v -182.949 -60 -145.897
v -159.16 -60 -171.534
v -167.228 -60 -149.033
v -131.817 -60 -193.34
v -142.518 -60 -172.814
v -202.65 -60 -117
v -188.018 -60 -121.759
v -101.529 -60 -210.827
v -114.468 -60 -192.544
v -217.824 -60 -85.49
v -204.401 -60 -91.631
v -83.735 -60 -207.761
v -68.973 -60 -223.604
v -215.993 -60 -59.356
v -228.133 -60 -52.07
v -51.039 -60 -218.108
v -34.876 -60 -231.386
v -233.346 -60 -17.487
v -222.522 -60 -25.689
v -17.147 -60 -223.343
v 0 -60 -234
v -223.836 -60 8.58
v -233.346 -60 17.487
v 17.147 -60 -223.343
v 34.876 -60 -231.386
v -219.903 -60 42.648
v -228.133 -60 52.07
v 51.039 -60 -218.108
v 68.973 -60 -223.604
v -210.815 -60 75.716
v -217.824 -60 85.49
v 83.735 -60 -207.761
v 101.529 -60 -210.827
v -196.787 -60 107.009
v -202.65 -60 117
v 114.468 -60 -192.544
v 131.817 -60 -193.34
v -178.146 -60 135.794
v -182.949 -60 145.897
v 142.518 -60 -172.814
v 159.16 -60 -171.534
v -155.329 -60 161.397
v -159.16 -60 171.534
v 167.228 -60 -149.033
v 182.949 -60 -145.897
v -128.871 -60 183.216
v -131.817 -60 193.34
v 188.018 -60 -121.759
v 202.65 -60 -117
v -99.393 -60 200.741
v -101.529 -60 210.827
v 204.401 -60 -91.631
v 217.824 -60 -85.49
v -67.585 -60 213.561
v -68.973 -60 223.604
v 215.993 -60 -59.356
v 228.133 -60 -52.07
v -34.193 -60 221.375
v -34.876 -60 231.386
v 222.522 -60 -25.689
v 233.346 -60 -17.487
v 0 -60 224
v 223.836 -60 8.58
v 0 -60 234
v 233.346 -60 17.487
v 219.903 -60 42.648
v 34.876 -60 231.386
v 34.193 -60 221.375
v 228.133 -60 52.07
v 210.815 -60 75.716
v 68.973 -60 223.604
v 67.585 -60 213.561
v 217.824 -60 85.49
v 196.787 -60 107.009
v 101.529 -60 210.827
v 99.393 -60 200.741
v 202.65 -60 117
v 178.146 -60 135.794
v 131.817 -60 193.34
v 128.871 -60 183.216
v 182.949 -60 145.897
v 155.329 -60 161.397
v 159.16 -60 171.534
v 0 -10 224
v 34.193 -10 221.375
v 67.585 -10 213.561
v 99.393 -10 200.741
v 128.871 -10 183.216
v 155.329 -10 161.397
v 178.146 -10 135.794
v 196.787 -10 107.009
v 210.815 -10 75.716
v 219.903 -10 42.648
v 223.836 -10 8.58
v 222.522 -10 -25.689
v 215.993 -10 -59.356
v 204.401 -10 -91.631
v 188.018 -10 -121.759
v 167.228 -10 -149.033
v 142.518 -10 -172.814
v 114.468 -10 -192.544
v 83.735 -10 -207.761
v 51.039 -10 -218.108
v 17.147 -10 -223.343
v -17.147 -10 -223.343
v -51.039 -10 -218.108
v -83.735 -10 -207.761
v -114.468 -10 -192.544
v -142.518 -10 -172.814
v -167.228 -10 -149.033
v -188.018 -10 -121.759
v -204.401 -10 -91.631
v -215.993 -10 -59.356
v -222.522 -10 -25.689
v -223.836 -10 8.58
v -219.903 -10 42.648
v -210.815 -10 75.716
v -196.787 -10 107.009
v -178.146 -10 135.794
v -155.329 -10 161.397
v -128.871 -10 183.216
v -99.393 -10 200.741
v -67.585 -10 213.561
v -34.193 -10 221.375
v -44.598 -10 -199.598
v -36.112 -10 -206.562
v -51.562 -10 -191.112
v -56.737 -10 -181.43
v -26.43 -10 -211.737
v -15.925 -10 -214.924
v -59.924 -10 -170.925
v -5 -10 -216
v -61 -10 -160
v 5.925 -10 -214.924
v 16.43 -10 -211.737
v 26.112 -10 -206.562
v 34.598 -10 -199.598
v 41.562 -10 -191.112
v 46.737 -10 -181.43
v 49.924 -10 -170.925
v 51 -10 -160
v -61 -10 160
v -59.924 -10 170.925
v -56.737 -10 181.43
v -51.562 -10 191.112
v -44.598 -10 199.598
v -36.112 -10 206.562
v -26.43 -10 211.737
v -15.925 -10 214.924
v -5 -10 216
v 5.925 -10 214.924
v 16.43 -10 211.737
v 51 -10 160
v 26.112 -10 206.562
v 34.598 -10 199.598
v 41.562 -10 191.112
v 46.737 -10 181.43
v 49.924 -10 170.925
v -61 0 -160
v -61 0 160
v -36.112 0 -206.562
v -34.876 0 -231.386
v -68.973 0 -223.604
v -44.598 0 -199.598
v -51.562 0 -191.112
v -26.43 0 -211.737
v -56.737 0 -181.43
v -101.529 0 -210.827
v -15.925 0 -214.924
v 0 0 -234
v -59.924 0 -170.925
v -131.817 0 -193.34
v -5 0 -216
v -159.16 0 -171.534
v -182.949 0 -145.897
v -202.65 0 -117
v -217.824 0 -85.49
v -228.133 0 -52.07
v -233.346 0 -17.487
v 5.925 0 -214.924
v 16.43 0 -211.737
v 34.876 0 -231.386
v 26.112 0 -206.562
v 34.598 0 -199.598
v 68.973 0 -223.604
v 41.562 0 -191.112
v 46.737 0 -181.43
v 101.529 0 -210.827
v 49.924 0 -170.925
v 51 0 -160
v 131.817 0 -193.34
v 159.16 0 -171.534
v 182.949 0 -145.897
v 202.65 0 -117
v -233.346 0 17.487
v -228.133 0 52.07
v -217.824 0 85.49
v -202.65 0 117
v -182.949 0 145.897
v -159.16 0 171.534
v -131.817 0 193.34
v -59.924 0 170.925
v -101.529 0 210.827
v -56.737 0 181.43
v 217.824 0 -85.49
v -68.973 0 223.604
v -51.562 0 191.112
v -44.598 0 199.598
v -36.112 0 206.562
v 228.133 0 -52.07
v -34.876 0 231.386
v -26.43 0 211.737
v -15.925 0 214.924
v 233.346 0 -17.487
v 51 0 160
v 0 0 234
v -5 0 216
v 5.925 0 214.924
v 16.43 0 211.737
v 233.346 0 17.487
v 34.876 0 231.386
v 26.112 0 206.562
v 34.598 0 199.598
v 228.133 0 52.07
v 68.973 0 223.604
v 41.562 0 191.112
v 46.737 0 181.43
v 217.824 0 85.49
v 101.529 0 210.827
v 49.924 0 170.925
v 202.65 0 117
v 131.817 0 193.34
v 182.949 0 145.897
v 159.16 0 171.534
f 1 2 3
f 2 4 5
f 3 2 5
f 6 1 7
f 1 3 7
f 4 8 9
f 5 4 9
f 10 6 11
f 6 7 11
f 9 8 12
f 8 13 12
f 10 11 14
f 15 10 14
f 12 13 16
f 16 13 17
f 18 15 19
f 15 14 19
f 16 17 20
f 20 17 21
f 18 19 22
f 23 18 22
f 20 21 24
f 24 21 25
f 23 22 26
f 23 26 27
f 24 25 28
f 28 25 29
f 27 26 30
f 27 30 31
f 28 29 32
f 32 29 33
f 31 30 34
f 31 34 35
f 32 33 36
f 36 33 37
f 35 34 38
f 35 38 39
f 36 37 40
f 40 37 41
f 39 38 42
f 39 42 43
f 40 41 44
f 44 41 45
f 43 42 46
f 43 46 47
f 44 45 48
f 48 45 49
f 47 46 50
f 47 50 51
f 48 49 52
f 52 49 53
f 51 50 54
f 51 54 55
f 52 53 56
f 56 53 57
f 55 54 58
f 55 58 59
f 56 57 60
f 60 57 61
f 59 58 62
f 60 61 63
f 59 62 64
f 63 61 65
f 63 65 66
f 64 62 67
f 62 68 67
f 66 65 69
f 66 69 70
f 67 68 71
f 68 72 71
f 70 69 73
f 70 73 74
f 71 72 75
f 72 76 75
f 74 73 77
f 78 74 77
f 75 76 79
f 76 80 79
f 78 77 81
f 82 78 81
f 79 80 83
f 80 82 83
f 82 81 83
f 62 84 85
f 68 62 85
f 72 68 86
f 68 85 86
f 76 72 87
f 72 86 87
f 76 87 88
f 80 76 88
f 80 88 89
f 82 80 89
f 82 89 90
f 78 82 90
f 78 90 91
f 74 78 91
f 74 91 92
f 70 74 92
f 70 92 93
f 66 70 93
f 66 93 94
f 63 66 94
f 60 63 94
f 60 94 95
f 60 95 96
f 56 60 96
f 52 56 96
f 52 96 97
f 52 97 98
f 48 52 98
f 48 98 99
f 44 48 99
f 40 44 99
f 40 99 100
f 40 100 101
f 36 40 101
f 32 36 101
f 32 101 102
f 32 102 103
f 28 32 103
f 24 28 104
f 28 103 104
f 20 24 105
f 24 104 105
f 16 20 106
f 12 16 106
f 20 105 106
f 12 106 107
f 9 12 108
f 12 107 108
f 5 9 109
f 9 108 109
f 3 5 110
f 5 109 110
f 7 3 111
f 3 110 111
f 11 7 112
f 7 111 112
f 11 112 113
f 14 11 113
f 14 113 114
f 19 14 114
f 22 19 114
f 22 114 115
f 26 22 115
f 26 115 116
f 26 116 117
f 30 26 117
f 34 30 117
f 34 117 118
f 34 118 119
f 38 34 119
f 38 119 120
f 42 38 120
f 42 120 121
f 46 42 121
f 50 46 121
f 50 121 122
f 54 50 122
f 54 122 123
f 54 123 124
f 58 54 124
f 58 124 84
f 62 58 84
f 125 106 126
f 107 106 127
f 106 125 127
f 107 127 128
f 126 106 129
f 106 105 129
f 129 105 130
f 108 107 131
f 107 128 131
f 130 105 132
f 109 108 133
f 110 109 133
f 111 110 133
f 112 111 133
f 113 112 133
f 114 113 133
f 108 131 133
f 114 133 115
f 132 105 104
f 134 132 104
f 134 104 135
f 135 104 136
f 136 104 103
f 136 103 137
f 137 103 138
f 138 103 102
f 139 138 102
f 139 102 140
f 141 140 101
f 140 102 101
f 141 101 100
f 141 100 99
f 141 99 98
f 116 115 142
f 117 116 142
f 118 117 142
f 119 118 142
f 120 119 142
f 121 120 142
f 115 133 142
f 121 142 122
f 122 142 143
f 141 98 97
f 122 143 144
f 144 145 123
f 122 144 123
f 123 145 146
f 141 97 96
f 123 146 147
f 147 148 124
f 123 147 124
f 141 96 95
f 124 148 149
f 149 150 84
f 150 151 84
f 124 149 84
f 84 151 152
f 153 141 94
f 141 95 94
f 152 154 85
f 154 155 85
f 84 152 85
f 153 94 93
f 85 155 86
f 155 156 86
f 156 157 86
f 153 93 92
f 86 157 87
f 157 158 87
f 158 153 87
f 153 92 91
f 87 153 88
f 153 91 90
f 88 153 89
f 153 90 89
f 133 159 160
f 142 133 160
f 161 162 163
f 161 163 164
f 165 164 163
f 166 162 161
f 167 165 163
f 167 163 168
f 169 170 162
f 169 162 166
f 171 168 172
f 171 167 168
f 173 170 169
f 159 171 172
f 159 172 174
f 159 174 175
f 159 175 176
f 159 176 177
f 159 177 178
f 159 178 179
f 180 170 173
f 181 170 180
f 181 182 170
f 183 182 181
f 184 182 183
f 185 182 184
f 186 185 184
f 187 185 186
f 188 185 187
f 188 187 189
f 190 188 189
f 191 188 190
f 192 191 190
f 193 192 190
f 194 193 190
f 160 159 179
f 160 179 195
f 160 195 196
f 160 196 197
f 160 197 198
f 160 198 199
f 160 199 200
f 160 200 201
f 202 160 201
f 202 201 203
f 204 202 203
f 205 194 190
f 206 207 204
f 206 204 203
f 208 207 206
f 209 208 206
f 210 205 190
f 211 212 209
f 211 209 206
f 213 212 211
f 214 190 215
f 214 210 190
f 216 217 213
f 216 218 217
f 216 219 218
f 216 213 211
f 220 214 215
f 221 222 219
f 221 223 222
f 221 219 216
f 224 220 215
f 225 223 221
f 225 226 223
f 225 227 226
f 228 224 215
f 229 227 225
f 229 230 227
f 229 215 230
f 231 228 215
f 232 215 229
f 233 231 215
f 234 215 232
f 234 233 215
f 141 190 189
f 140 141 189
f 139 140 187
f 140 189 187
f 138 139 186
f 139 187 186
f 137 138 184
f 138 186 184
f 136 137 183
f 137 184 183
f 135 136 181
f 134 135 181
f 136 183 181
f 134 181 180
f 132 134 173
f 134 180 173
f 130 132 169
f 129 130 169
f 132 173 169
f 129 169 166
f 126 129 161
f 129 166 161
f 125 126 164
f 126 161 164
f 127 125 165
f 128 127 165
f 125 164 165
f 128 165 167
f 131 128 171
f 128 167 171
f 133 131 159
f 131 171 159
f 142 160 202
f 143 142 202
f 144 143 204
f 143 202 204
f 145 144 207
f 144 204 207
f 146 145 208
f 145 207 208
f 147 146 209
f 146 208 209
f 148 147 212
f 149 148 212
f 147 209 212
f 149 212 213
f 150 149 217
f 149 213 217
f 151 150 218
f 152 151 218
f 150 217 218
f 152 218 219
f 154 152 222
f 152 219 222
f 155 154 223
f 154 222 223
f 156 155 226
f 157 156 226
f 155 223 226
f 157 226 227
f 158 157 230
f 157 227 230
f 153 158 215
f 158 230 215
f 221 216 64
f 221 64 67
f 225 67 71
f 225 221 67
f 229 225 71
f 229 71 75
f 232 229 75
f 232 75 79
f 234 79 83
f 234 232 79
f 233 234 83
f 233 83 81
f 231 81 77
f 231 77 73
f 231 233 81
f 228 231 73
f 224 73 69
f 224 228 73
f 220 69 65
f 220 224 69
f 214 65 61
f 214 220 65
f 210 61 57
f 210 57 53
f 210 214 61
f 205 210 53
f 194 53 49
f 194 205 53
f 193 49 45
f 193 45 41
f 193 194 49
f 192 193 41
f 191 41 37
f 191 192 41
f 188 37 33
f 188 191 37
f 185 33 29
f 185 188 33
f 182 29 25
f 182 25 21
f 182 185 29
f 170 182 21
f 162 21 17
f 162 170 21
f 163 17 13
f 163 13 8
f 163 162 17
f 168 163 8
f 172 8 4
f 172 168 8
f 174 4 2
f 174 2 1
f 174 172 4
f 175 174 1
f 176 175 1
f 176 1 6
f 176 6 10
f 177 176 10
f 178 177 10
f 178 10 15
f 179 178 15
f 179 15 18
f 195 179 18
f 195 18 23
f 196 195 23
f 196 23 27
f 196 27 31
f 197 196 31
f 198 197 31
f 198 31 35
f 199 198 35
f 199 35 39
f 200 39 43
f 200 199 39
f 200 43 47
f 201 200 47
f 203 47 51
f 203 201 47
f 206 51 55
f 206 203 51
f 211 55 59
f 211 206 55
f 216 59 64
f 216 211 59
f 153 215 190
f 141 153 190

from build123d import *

# Parameters (mm, degrees)
SKETCH1_R           = 234
SKETCH1_R_2         = 224
BOSS_EXTRUDE1_DEPTH = 60
SKETCH1_3_R         = 224
BOSS_EXTRUDE2_DEPTH = 10


with BuildPart() as part:
    # Sketch1 → Boss-Extrude1 (new body)
    with BuildSketch(Plane(origin=(0, 0, 0), x_dir=(1, 0, 0), z_dir=(0, 1, 0))):
        Circle(SKETCH1_R)
        Circle(SKETCH1_R_2, mode=Mode.SUBTRACT)
    extrude(amount=-BOSS_EXTRUDE1_DEPTH)

    # Sketch1<3> → Boss-Extrude2 (add)
    with BuildSketch(Plane(origin=(0, 0, 0), x_dir=(1, 0, 0), z_dir=(0, 1, 0))):
        Circle(SKETCH1_3_R)
        with BuildLine():
            ThreePointArc((-61, 160), (-5, 216), (51, 160))
            Line((51, 160), (51, -160))
            ThreePointArc((51, -160), (-5, -216), (-61, -160))
            Line((-61, -160), (-61, 160))
        make_face(mode=Mode.SUBTRACT)
    extrude(amount=-BOSS_EXTRUDE2_DEPTH)


solid = part.part
